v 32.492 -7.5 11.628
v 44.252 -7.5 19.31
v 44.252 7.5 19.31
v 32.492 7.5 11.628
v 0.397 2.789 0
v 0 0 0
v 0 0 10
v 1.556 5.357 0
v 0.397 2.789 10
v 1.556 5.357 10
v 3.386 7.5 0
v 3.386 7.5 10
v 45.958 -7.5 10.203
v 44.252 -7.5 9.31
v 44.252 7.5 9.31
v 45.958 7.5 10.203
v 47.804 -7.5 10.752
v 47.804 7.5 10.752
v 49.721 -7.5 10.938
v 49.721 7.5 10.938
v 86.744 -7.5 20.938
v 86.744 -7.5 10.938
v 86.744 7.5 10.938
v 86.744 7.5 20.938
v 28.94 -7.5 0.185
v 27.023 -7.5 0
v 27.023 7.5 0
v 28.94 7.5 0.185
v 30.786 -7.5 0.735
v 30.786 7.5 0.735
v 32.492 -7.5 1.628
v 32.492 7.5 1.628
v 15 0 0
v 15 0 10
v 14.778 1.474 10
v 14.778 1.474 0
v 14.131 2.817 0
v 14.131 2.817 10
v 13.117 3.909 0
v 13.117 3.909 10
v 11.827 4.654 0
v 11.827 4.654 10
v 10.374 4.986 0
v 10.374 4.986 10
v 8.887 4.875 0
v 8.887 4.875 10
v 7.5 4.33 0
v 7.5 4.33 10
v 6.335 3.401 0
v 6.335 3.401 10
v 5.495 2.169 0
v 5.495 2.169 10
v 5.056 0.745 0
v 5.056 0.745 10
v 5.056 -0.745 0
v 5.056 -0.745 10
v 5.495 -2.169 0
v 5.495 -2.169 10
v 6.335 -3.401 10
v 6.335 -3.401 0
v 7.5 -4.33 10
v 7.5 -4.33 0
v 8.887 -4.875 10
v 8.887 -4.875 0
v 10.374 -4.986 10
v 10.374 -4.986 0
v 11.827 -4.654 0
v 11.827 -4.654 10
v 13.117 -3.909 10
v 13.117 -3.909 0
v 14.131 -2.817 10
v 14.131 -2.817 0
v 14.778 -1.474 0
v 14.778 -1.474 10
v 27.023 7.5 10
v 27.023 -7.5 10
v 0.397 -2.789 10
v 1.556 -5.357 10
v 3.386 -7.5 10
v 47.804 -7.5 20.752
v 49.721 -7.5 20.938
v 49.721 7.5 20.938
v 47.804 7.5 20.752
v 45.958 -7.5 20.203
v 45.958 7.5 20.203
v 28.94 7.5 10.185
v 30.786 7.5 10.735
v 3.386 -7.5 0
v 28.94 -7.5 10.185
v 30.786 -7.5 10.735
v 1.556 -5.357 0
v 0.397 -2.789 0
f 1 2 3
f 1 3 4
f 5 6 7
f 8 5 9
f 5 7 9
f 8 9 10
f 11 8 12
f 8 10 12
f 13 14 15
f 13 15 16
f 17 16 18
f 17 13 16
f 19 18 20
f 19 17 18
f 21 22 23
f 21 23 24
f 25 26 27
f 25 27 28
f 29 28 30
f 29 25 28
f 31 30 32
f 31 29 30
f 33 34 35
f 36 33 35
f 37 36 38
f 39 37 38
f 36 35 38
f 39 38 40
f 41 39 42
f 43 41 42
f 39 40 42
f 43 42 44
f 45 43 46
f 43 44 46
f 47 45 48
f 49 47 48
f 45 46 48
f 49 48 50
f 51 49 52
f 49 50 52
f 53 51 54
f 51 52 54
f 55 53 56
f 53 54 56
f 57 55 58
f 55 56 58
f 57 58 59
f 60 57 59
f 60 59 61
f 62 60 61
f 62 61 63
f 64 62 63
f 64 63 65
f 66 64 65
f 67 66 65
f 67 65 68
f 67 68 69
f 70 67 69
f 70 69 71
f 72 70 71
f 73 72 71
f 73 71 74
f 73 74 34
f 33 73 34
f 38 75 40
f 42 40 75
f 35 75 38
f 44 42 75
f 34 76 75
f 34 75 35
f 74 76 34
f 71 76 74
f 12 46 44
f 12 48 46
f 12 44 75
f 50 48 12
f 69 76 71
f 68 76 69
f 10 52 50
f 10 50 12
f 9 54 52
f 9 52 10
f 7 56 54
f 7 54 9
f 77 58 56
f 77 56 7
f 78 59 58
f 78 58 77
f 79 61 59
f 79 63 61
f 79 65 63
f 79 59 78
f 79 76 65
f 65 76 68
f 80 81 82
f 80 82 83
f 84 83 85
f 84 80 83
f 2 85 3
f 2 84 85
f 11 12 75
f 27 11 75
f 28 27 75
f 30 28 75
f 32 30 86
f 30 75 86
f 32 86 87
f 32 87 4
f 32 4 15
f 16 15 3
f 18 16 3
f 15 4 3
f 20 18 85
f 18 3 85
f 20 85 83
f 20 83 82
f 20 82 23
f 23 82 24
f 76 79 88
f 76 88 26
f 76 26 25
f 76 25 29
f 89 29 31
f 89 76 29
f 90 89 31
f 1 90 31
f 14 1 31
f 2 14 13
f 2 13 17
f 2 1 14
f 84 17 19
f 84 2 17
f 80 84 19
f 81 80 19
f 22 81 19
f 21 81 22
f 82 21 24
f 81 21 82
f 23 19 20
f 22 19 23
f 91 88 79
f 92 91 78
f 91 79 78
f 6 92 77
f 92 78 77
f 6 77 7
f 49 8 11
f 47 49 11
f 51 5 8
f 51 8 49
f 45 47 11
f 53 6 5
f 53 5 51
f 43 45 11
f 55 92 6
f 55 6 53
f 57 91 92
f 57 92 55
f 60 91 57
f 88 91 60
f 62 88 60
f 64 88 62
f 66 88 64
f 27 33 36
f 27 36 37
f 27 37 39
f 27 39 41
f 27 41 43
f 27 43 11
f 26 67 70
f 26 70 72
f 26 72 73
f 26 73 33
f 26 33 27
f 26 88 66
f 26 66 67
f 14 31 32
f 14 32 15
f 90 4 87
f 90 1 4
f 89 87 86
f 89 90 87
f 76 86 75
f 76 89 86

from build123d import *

# Parameters (mm, degrees)
F1_DEPTH = 7.5
F2_R     = 5
F3_DEPTH = 10.001
F5_DEPTH = 10.001


with BuildPart() as f1:
    # F0 (on Front) → F1 (new body, symmetric)
    with BuildSketch(Plane.XZ):
        with BuildLine():
            Line((0, 10), (0, 0))
            Line((0, 0), (27.023239, 0))
            ThreePointArc((27.023239, 0), (29.876277, 0.415629), (32.492154, 1.627965))
            Line((32.492154, 1.627965), (44.251915, 9.309865))
            ThreePointArc((44.251915, 9.309865), (46.867792, 10.522202), (49.72083, 10.937831))
            Line((49.72083, 10.937831), (86.744069, 10.937831))
            Line((86.744069, 10.937831), (86.744069, 20.937831))
            Line((86.744069, 20.937831), (49.72083, 20.937831))
            ThreePointArc((49.72083, 20.937831), (46.867792, 20.522202), (44.251915, 19.309865))
            Line((44.251915, 19.309865), (32.492154, 11.627965))
            ThreePointArc((32.492154, 11.627965), (29.876277, 10.415629), (27.023239, 10))
            Line((27.023239, 10), (0, 10))
        make_face()
    extrude(amount=F1_DEPTH, both=True)

    # F2 (on face) → F3 (cut, through all)
    with BuildSketch(Plane.XY.offset(10)):
        with Locations((10, 0)):
            Circle(F2_R)
    extrude(amount=-F3_DEPTH, mode=Mode.SUBTRACT)

    # F4 (on face) → F5 (cut, through all)
    with BuildSketch(Plane.XY.offset(10)):
        with BuildLine():
            ThreePointArc((3.385622, -7.5), (0.885622, -4.114378), (0, 0))
            Line((0, 0), (0, -7.5))
            Line((0, -7.5), (3.385622, -7.5))
        make_face()
        with BuildLine():
            ThreePointArc((0, 0), (0.885622, 4.114378), (3.385622, 7.5))
            Line((3.385622, 7.5), (0, 7.5))
            Line((0, 7.5), (0, 0))
        make_face()
    extrude(amount=-F5_DEPTH, mode=Mode.SUBTRACT)


solid = f1.part
